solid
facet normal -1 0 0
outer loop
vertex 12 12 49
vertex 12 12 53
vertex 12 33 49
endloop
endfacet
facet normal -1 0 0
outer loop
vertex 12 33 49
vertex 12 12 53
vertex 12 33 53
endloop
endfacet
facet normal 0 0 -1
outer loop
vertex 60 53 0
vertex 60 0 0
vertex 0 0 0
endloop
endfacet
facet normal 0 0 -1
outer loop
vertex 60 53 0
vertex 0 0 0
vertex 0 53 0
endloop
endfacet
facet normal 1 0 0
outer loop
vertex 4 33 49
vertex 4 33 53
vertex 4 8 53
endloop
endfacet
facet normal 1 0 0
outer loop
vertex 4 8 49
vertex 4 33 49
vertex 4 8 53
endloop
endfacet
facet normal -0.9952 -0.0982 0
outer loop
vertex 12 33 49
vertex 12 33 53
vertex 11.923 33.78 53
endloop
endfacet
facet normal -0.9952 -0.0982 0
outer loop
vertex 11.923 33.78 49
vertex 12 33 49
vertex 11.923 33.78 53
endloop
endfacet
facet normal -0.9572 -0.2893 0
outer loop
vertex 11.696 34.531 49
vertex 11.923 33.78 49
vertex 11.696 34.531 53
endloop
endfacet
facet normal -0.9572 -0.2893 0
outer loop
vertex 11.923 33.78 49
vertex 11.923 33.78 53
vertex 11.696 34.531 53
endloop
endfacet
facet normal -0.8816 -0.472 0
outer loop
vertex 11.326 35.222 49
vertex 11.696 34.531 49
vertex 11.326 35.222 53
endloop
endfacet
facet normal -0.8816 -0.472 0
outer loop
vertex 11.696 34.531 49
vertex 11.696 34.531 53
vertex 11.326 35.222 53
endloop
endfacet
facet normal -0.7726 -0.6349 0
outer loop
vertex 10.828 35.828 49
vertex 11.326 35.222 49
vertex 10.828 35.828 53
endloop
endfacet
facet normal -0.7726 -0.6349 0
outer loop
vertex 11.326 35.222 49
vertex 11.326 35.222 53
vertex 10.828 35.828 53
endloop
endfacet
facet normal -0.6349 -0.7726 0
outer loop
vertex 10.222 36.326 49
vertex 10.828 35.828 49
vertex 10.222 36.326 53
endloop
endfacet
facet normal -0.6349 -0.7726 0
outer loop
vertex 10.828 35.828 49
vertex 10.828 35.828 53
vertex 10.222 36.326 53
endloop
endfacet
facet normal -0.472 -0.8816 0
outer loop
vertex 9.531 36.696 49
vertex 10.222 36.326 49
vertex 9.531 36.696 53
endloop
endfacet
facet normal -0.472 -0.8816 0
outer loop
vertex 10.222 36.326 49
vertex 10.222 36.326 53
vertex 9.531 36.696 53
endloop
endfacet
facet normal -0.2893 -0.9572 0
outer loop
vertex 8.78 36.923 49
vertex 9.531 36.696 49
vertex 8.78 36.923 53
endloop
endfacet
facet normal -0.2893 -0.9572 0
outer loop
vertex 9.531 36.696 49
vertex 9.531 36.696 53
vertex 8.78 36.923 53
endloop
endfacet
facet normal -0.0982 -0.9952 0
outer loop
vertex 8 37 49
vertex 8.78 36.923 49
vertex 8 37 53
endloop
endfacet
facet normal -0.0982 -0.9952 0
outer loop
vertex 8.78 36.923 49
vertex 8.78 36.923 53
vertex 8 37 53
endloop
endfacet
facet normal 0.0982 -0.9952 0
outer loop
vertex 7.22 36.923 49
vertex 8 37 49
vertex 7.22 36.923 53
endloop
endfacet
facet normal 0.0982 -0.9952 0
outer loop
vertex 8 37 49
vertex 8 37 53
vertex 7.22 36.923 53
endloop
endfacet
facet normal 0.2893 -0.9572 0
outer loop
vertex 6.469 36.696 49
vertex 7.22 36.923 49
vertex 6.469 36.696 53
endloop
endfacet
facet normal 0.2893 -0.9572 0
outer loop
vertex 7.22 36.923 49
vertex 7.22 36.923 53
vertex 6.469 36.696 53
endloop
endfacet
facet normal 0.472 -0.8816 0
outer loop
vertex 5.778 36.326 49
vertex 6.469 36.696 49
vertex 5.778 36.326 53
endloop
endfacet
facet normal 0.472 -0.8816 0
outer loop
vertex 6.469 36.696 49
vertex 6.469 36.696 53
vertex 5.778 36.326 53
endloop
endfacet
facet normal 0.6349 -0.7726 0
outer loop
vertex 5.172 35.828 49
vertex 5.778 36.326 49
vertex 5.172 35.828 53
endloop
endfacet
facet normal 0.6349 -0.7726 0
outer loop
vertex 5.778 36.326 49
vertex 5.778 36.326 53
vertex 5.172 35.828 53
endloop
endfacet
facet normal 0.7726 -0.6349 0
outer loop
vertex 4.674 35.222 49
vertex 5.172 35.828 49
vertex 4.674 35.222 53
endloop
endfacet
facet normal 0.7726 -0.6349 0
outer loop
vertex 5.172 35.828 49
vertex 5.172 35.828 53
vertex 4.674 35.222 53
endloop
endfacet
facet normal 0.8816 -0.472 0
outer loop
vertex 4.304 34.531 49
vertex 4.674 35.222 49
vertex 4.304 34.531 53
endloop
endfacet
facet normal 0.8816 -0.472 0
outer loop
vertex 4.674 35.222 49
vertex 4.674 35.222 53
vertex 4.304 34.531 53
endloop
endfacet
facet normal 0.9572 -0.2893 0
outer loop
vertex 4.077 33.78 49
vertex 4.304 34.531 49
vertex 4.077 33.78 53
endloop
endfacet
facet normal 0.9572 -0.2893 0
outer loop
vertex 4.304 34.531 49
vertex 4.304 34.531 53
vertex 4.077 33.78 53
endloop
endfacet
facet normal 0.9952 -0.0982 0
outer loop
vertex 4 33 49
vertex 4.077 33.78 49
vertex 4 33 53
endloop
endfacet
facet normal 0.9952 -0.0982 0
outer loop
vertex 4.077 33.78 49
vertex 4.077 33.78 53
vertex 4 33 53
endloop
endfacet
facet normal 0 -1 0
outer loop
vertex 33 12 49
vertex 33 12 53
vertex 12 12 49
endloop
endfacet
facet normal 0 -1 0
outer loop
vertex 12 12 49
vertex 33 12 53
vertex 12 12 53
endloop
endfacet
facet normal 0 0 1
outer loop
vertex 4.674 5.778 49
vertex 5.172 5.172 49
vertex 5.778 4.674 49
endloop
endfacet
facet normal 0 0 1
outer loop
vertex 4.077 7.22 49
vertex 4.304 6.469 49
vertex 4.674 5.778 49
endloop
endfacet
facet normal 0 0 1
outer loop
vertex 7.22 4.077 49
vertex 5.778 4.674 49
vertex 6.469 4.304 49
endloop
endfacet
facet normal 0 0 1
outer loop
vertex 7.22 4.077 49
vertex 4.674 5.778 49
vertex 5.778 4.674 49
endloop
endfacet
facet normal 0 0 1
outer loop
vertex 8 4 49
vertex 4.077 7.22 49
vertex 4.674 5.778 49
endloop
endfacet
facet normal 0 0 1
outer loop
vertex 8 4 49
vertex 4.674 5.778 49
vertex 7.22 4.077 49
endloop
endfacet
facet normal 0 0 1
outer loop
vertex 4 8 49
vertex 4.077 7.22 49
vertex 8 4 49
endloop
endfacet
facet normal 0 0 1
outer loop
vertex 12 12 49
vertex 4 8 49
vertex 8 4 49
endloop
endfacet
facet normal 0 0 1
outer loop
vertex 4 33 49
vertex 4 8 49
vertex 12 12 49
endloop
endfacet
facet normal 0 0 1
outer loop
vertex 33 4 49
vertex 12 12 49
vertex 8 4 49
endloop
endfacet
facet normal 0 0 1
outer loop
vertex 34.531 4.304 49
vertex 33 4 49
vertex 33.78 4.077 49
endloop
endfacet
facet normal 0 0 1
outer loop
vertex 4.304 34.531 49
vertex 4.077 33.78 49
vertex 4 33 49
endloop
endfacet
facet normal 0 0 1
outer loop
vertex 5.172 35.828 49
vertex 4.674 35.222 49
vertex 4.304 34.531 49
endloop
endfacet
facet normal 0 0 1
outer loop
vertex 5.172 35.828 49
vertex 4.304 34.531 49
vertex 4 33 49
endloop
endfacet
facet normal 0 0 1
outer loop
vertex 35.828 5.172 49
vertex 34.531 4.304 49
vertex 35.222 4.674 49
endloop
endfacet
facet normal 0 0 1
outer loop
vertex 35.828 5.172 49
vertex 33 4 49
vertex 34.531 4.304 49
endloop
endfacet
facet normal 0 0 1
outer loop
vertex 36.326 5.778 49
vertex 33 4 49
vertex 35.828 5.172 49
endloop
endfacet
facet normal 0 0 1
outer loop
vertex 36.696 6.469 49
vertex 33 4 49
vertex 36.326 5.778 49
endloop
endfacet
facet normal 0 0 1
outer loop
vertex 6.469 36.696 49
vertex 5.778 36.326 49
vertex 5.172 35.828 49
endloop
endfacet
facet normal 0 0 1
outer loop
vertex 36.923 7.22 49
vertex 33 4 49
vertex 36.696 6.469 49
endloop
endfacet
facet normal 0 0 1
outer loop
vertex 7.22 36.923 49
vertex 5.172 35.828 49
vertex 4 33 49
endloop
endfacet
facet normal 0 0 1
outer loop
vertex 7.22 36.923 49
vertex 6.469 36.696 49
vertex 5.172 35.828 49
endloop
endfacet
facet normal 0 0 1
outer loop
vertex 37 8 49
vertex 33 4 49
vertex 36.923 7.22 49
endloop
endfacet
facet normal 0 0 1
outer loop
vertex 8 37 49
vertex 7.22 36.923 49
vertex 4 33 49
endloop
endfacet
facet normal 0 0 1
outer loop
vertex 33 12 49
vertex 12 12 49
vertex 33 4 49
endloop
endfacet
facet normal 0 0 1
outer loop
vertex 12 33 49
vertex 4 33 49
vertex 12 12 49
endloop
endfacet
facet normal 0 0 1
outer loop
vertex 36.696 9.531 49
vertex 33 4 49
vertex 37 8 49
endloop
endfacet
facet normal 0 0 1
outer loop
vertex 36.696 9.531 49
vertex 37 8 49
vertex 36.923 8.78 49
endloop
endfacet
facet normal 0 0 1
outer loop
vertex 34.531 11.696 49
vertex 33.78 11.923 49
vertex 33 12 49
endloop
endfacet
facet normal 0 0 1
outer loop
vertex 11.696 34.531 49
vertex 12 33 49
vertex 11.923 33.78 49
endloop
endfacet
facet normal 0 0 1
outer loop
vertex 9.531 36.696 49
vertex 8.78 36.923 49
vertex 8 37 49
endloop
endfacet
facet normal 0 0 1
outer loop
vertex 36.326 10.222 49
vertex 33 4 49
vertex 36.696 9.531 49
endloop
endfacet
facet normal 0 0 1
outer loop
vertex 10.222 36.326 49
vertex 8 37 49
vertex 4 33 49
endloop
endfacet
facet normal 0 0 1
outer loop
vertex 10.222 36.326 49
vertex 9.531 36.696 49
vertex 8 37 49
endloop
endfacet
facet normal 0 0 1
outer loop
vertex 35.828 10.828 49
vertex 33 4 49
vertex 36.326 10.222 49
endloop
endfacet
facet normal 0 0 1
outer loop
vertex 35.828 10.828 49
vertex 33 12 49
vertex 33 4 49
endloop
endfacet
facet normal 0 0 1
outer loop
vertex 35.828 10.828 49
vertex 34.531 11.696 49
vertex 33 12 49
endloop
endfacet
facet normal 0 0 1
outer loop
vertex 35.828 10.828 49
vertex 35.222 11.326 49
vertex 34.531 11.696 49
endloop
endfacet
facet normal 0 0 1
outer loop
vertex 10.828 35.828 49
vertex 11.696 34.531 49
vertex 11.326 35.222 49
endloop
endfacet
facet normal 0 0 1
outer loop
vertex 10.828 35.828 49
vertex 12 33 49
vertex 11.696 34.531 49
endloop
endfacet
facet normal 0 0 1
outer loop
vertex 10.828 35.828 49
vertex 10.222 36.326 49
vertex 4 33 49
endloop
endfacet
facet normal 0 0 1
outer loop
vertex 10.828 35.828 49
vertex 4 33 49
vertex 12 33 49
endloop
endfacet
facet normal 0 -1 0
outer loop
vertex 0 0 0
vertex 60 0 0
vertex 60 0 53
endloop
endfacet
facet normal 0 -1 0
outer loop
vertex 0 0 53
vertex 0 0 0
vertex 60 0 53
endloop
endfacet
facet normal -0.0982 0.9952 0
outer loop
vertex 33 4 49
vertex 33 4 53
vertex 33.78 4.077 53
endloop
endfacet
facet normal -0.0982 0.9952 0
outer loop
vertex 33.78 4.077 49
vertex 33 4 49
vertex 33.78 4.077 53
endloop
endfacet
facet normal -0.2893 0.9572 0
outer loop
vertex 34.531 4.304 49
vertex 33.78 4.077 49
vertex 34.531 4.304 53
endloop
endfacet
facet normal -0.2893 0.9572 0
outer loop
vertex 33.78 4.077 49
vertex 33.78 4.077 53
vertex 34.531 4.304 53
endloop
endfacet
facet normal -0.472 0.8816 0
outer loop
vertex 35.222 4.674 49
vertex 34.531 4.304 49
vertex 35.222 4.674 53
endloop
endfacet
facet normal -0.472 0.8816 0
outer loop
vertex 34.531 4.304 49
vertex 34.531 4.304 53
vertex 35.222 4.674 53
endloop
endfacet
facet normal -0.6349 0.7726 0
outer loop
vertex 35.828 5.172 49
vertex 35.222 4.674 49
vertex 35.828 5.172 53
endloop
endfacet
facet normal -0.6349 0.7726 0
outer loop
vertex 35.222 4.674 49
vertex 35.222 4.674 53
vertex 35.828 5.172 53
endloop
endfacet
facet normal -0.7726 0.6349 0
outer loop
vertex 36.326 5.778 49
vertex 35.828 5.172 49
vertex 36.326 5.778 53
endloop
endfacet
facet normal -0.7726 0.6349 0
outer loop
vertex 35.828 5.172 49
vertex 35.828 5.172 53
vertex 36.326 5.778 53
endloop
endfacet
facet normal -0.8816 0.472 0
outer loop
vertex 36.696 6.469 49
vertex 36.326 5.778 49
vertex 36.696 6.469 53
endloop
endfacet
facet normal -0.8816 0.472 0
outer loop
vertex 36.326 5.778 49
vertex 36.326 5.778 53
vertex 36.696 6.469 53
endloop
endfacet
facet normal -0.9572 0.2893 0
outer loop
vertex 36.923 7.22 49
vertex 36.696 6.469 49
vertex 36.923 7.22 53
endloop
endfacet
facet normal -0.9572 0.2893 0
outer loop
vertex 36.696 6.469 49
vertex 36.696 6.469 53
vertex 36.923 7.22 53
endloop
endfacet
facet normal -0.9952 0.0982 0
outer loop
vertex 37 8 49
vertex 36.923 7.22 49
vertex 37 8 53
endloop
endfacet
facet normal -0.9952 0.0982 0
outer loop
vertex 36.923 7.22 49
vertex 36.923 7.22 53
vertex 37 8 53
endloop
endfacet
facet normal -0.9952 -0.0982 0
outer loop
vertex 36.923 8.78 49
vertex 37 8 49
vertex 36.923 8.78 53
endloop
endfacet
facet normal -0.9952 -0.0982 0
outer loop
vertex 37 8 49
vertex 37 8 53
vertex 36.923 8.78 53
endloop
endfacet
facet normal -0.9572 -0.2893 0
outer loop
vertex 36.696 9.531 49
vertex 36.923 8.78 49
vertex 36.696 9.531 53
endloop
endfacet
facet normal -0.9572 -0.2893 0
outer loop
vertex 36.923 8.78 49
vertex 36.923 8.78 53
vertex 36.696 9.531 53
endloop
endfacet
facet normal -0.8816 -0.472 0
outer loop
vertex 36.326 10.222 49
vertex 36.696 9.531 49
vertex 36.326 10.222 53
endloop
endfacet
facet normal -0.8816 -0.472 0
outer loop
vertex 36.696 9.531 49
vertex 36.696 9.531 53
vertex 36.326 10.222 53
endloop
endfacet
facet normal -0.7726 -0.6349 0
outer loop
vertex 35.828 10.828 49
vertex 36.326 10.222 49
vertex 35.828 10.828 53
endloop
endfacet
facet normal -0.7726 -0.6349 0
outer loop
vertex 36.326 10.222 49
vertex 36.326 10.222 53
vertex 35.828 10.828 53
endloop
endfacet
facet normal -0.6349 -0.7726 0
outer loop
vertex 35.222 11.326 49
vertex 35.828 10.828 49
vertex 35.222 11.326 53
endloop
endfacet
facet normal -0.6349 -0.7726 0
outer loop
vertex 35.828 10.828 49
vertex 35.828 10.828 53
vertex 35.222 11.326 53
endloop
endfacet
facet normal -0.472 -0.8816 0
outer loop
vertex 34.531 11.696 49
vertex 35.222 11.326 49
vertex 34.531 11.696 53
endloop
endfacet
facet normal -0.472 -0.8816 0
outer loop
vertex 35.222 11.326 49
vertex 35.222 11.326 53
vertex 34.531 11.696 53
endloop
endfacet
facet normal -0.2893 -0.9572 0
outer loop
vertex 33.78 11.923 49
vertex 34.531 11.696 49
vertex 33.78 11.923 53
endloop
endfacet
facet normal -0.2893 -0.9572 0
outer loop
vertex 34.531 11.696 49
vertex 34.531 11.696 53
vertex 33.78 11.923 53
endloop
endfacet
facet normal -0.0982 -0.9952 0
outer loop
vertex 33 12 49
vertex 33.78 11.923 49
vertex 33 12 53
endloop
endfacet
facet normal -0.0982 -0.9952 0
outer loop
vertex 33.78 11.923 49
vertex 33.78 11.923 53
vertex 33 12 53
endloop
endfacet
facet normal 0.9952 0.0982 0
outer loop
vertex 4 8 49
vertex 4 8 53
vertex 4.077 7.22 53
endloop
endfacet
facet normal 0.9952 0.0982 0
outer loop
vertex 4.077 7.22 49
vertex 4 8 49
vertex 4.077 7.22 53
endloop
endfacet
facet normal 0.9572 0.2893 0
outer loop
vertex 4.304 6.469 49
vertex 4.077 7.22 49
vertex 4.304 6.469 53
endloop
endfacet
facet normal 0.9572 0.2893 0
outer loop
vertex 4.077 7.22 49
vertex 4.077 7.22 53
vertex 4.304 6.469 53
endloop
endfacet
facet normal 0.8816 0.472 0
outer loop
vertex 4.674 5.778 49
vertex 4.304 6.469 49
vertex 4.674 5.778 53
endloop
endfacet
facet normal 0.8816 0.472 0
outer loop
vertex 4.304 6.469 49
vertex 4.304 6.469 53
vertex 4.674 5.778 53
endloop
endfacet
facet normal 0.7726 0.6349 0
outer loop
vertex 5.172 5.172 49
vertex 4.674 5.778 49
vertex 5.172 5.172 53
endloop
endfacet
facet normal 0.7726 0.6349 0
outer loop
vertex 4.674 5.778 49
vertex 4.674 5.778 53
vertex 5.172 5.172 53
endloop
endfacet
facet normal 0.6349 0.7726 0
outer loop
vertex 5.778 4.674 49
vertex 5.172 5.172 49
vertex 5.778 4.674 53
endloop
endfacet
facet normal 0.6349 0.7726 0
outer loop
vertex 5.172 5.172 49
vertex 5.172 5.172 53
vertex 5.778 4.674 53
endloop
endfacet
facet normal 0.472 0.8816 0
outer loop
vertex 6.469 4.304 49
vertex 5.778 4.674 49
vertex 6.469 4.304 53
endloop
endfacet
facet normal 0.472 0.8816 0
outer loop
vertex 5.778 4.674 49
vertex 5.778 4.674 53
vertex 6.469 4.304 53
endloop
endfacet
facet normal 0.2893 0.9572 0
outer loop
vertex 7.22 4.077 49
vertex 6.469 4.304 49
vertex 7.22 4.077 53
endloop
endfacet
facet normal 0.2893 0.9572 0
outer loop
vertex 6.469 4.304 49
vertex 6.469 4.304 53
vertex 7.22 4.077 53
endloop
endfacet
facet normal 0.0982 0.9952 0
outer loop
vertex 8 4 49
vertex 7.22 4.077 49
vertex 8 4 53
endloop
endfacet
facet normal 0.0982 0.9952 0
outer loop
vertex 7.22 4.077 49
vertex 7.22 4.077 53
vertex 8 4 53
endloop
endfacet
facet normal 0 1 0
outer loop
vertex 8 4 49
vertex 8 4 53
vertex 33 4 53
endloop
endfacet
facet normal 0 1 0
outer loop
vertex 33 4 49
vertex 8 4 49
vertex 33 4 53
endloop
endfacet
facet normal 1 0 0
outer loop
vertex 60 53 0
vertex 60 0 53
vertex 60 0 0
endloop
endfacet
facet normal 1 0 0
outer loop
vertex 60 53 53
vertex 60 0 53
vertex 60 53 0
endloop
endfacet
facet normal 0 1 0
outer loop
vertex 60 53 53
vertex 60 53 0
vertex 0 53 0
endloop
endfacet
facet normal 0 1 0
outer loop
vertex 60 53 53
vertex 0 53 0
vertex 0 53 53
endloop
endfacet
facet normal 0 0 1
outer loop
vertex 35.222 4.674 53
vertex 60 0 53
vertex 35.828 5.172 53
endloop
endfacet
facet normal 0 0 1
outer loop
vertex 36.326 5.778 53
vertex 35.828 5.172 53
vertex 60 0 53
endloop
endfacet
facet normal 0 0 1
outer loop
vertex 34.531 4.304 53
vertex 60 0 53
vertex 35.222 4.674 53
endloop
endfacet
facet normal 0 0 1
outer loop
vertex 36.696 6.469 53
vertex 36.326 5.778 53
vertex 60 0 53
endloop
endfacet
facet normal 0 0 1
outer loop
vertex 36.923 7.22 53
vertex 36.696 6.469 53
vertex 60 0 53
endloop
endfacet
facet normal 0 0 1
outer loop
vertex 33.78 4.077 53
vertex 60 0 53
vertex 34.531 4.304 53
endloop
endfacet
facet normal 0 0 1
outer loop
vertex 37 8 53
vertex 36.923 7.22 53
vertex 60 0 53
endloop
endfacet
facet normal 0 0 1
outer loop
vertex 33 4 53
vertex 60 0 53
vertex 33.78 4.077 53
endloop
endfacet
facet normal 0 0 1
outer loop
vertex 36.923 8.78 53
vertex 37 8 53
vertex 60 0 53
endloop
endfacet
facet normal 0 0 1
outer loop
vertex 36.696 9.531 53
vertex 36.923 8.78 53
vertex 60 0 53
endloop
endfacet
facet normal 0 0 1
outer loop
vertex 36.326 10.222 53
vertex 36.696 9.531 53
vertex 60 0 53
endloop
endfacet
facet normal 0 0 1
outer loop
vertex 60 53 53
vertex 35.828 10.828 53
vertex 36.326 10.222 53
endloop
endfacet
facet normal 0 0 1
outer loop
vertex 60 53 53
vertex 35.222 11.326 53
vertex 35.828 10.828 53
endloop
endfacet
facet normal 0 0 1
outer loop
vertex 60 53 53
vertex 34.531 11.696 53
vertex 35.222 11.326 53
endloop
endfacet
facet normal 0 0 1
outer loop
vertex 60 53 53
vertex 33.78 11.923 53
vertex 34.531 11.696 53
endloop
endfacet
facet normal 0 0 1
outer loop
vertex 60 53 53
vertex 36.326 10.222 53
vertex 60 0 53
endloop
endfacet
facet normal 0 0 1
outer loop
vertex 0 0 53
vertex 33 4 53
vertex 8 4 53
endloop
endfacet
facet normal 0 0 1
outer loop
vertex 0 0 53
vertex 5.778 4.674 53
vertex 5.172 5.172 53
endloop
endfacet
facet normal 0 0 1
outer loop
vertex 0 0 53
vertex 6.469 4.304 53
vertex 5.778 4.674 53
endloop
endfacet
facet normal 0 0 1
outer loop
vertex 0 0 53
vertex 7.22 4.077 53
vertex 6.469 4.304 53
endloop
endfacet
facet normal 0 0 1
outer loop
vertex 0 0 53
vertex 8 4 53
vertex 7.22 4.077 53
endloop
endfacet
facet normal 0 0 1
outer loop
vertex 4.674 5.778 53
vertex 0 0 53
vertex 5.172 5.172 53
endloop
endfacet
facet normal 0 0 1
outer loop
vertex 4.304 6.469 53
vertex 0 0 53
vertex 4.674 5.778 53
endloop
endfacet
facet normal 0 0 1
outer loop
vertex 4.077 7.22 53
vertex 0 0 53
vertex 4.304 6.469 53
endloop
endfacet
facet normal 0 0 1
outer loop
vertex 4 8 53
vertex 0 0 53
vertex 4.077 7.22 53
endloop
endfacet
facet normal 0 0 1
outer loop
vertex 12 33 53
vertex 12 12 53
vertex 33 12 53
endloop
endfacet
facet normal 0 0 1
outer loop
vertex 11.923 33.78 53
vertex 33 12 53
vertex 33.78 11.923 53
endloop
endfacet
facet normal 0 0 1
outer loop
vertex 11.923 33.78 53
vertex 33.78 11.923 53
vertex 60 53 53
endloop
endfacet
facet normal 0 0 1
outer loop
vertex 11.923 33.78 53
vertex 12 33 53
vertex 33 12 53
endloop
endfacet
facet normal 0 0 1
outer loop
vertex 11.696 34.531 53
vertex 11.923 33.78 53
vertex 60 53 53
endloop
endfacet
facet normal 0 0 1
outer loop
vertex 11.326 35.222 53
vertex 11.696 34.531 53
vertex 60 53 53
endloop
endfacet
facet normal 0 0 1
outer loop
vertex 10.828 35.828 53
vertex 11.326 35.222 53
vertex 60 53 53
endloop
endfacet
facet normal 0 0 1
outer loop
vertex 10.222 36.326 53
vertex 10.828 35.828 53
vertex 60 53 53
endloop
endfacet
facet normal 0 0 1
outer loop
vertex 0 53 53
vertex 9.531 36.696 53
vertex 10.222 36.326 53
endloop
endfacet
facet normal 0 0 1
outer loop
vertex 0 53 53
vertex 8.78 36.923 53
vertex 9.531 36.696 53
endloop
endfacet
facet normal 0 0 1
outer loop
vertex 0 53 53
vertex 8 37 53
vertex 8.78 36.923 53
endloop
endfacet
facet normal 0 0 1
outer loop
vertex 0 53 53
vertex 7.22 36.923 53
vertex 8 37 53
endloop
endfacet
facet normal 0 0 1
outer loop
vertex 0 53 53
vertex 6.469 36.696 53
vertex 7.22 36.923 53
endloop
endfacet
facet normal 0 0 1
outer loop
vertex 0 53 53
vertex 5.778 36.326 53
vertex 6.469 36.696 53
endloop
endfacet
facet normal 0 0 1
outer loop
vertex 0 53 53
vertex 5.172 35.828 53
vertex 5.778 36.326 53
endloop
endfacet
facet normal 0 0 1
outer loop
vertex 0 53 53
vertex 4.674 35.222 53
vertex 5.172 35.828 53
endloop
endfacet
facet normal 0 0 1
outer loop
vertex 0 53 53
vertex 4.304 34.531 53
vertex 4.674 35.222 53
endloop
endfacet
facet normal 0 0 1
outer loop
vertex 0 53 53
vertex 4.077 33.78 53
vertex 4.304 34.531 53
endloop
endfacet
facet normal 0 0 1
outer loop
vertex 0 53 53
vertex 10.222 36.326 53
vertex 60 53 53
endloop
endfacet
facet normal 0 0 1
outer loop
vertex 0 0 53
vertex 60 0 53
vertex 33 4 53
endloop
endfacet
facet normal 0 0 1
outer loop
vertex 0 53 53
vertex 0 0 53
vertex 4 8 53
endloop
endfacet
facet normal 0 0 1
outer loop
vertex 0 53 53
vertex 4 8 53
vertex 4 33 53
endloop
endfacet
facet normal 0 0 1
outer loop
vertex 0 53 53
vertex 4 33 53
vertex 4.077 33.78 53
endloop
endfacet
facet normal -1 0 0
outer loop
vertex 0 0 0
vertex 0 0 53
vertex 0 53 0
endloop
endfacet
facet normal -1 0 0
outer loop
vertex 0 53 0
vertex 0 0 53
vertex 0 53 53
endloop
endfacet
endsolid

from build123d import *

# Parameters (mm, degrees)
F0_W     = 53
F0_H     = 53
F1_DEPTH = 60
F3_DEPTH = 4


with BuildPart() as f1:
    # F0 (on Right) → F1 (new body)
    with BuildSketch(Plane.YZ):
        with Locations((26.5, 26.5)):
            Rectangle(F0_W, F0_H)
    extrude(amount=F1_DEPTH)

    # F2 (on face) → F3 (cut)
    with BuildSketch(Plane.XY.offset(53)):
        with BuildLine():
            ThreePointArc((12, 33), (8, 37), (4, 33))
            Line((4, 33), (4, 8))
            ThreePointArc((4, 8), (5.171573, 5.171573), (8, 4))
            Line((8, 4), (33, 4))
            ThreePointArc((33, 4), (37, 8), (33, 12))
            Line((33, 12), (12, 12))
            Line((12, 12), (12, 33))
        make_face()
    extrude(amount=-F3_DEPTH, mode=Mode.SUBTRACT)


solid = f1.part
